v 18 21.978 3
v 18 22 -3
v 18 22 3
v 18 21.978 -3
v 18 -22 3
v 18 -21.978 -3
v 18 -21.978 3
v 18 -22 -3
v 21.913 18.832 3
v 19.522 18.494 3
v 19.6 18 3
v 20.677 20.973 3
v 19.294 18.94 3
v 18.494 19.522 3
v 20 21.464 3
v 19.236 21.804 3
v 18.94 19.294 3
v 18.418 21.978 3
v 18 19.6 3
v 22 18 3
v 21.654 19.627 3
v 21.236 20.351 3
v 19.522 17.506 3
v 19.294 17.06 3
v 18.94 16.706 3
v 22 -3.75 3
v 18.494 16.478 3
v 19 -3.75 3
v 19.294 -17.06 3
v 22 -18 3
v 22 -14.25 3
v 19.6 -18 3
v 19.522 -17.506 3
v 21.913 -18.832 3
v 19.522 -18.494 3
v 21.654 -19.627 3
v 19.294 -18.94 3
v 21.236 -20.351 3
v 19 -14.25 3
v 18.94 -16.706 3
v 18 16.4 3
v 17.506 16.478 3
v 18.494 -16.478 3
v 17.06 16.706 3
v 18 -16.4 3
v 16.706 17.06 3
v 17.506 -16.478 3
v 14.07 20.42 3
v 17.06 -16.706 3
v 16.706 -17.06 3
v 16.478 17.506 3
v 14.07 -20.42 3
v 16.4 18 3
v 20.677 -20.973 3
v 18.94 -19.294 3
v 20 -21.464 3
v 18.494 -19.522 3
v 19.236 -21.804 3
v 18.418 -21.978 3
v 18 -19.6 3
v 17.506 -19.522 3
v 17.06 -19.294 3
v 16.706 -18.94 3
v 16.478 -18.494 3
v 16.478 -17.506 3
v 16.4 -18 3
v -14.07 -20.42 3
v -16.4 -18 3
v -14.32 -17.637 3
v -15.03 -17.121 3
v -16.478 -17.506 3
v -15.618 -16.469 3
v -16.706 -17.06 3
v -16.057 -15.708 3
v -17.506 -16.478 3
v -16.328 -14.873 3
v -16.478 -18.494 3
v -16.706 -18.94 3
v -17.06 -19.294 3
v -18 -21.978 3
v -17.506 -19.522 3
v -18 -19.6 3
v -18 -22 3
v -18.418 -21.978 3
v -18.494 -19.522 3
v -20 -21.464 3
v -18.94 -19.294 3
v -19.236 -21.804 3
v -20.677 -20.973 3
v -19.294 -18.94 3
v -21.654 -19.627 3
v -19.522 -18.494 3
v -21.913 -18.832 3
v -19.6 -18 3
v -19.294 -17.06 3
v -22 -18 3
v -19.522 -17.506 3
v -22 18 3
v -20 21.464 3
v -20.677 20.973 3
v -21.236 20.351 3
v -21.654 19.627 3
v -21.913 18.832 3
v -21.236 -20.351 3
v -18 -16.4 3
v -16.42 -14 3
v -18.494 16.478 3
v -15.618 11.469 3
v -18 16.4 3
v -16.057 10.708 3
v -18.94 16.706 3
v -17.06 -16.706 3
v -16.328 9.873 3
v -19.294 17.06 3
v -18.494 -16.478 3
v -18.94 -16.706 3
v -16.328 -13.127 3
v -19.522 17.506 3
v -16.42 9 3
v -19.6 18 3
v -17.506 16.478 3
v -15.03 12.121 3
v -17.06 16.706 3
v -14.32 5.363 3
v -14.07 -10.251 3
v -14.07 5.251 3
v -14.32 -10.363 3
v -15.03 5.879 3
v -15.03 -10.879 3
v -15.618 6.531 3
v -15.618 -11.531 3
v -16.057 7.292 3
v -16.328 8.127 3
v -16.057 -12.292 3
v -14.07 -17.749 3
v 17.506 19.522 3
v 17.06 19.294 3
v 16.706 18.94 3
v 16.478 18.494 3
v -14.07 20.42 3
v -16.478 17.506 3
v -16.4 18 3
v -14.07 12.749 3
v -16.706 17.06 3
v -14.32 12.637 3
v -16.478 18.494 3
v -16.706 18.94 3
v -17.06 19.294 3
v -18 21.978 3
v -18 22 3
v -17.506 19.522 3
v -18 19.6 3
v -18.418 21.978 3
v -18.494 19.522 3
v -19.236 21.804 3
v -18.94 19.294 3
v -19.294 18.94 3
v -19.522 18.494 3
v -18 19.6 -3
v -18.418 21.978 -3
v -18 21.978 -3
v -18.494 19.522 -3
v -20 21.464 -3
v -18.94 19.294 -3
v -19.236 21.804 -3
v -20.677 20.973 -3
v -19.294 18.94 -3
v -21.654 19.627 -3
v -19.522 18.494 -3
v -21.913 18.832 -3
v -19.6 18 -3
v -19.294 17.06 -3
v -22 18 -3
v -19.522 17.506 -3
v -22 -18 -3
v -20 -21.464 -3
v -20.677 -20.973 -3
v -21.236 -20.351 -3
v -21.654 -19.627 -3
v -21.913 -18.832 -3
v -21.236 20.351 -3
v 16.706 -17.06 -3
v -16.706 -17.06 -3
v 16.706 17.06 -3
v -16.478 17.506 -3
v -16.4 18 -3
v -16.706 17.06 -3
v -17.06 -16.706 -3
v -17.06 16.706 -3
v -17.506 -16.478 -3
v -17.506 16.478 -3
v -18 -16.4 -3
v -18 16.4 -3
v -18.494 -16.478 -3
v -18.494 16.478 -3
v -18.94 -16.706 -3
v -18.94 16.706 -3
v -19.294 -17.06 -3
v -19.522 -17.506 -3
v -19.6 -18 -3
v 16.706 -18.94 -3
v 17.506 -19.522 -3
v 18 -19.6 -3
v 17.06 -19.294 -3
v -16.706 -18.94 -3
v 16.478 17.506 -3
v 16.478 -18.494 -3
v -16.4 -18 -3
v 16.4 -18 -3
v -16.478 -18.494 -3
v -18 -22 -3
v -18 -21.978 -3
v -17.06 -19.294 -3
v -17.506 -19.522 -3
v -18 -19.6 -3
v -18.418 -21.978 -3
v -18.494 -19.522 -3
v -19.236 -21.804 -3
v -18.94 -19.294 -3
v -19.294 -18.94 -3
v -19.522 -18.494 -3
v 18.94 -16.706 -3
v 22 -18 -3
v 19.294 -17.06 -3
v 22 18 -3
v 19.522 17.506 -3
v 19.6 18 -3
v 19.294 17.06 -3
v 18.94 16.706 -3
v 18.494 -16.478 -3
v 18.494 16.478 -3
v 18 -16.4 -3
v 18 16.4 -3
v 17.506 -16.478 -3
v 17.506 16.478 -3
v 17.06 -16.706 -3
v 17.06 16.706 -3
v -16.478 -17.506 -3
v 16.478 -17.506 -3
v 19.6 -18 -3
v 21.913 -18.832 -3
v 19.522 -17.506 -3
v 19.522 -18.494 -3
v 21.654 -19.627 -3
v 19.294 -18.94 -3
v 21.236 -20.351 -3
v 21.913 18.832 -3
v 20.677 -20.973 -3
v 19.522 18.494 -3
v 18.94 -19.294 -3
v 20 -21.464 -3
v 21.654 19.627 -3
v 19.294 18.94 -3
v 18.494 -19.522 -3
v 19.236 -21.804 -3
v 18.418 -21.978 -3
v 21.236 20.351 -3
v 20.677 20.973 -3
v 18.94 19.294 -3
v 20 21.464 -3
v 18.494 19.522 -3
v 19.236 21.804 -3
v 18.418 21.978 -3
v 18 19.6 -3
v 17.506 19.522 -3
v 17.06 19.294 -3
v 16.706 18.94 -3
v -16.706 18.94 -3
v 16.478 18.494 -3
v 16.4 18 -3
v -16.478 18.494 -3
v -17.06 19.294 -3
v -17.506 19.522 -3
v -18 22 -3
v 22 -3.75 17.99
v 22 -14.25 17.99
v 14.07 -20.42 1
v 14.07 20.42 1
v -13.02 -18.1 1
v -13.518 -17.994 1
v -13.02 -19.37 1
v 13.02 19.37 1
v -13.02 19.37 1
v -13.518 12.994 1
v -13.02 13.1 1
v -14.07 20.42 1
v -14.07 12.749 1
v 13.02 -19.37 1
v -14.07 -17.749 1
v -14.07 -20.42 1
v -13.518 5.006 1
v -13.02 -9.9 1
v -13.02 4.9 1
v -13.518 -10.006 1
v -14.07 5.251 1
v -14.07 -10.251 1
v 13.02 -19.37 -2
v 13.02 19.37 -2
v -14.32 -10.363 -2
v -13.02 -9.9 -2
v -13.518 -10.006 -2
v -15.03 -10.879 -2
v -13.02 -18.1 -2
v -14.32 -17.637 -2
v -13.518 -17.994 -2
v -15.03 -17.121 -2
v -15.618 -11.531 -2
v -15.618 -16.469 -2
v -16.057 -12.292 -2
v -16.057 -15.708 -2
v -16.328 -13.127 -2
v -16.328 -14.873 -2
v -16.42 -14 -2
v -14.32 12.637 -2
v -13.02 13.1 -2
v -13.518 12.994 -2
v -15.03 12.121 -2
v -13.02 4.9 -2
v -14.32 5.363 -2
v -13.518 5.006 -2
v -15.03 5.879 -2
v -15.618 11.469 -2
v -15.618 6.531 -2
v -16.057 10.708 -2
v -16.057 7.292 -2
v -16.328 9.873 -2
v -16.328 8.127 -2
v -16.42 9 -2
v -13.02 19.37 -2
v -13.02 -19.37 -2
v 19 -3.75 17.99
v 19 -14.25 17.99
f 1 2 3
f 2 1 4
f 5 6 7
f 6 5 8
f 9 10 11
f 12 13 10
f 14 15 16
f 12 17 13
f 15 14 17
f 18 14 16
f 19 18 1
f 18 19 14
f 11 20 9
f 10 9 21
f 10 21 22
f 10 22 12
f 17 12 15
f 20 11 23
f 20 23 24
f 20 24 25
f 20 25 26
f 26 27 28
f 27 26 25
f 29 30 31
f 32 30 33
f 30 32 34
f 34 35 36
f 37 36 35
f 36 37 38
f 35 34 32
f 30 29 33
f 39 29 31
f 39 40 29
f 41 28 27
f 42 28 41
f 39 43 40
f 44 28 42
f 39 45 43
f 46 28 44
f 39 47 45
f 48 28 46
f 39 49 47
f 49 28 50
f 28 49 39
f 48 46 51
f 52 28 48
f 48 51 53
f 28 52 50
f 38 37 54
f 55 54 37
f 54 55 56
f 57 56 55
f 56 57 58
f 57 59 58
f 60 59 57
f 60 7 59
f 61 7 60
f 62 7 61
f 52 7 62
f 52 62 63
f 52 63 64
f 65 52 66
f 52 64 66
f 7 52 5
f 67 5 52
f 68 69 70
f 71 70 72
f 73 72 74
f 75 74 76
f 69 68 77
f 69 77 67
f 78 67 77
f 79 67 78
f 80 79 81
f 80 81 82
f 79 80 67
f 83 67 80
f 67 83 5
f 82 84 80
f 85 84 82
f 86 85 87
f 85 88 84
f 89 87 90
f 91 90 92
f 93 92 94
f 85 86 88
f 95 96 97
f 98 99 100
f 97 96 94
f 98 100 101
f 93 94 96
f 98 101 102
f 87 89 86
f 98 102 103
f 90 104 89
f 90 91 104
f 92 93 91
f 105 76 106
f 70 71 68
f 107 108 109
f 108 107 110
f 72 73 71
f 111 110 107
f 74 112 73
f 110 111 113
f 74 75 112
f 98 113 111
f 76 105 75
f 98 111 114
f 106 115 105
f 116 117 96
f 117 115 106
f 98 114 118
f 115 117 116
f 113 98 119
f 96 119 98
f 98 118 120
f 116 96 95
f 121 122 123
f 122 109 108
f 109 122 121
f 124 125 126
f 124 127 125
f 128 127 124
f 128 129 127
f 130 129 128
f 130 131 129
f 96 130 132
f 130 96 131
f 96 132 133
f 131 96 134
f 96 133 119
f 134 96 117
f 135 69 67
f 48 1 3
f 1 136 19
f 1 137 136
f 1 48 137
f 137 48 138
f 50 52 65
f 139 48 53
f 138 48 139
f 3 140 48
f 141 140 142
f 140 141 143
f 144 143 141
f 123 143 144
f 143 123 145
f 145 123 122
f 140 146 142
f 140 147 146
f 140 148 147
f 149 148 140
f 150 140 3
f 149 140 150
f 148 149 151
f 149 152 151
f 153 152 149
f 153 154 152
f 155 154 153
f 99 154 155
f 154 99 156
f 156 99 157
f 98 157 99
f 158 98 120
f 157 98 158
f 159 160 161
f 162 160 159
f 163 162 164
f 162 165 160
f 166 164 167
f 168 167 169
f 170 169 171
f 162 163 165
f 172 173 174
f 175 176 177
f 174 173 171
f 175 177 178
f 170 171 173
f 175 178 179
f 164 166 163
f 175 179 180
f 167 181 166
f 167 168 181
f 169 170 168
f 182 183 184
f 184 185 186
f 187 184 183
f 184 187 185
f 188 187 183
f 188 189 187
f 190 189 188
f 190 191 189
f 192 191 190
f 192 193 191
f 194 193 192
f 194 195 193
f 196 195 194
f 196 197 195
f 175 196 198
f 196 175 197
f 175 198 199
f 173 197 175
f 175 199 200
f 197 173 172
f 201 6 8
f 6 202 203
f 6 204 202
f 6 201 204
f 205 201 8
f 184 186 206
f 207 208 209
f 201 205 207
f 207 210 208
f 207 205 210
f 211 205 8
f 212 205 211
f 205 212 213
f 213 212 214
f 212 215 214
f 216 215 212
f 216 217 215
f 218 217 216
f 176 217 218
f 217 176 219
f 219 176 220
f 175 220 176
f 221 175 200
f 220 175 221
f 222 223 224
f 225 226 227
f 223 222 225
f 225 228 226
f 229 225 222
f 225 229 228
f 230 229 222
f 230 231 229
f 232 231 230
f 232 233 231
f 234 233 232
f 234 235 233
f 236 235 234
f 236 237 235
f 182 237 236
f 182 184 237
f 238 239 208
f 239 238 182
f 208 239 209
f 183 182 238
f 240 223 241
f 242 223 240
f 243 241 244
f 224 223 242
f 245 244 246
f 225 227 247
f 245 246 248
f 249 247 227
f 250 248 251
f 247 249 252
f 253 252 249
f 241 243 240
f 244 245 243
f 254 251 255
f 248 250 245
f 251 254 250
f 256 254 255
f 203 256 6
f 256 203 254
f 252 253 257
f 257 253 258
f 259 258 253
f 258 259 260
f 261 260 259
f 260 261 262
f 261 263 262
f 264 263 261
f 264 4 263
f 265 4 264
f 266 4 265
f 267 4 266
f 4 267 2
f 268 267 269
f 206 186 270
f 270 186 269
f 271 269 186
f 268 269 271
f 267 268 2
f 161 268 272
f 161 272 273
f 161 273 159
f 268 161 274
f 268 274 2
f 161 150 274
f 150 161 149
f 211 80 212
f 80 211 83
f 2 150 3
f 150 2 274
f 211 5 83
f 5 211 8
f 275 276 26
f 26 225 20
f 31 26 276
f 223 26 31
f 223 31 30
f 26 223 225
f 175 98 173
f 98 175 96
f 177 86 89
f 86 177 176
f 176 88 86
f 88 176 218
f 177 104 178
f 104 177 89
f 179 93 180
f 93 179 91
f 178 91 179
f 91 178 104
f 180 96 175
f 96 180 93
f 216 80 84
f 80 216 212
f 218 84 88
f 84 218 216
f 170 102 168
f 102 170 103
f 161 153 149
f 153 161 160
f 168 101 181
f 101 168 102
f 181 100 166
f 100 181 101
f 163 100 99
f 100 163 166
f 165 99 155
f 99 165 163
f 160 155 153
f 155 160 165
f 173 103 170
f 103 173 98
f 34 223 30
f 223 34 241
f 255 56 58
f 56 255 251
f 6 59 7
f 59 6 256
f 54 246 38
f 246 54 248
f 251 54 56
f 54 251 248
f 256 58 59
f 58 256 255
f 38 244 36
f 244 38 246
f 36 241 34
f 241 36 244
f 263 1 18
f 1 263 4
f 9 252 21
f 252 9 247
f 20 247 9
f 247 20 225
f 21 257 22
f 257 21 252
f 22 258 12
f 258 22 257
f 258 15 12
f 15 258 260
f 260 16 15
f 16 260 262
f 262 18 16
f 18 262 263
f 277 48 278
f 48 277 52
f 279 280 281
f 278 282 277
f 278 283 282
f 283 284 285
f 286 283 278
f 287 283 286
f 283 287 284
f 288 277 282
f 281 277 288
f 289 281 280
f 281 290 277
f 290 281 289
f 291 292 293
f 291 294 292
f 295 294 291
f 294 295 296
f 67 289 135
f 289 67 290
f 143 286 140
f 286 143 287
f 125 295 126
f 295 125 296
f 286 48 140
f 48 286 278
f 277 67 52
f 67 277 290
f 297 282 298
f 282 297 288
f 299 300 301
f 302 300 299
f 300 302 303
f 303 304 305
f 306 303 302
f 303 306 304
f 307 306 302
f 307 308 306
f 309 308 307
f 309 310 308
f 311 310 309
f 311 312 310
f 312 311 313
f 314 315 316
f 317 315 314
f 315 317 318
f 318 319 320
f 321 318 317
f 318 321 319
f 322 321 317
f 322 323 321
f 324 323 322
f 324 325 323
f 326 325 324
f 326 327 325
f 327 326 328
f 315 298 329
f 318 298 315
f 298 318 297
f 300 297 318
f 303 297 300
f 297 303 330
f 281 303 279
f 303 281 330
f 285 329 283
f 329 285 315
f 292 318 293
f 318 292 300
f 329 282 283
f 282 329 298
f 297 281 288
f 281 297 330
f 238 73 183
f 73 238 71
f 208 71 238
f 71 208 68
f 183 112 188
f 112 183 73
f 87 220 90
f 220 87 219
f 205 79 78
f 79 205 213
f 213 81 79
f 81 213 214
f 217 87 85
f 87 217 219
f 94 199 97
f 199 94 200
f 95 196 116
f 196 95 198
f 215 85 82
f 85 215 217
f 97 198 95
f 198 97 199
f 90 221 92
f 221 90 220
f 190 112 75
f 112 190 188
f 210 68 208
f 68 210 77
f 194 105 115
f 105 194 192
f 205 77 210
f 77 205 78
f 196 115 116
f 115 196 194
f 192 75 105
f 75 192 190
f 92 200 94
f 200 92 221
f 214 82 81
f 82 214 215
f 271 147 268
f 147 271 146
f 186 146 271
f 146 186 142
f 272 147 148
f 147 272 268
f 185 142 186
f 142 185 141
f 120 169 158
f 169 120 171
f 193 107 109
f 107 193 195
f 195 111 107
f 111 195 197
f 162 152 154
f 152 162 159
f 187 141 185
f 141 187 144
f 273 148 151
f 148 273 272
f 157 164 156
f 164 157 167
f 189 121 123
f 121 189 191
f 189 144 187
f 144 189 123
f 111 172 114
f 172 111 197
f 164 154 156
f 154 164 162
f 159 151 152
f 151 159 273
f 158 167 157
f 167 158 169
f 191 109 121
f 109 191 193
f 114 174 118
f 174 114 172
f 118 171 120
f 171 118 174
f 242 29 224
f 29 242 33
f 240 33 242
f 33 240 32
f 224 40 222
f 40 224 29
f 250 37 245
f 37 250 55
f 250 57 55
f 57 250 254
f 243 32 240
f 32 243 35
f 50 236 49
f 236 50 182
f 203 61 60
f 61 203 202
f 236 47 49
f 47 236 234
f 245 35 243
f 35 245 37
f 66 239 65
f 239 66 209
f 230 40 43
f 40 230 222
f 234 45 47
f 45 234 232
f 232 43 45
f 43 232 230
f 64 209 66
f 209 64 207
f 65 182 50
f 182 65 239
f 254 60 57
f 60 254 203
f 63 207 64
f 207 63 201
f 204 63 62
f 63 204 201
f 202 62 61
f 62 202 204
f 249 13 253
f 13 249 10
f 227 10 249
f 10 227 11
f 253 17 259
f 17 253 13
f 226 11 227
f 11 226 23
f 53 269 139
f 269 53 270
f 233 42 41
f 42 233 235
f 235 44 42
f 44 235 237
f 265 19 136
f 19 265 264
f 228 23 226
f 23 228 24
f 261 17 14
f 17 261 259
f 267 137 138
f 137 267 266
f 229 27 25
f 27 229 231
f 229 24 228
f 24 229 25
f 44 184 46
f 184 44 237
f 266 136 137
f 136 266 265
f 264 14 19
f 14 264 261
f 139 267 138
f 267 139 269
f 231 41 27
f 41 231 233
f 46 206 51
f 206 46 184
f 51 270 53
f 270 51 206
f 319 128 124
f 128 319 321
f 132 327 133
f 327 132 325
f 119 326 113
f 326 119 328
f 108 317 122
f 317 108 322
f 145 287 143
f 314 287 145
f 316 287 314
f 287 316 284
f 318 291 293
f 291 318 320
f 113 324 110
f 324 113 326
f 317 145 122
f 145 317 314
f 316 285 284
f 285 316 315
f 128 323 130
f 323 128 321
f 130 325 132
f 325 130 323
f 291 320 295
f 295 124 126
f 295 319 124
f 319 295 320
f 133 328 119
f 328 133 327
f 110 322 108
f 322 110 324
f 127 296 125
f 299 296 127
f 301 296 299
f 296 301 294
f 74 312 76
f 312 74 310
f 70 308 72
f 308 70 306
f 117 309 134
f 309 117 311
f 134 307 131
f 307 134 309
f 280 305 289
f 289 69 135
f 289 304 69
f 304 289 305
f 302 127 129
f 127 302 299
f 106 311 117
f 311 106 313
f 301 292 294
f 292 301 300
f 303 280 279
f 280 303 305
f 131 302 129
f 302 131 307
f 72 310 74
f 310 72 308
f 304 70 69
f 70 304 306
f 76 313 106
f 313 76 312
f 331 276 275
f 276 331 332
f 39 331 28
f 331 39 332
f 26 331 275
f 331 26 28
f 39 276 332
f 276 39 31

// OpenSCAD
// file: electronics.scad
/*
 * electronics.scad 
 *
 * (c) 2015 Prof Dr Andreas Mueller, Hochschule Rapperswil
 */
board_width = 27.94 + 0.1;
board_height = 40.64 + 0.1;
board_thickness = 2.0;

gap = 0.1;

width = 44;
height = 44;
r = 4;
bottom_height = 6;
top_height = 18;

button1_x = -board_width / 2 + 1.8;
button1_y = -9;

button2_x = -board_width / 2 + 1.8;
button2_y = +14;

led1_x = 25.5 - board_width/2;
led1_y = 18;
led2_x = led1_x;
led2_y = 1.5;

switchwidth = 3.5;
switchheight = 4.5;

button_gap = 0.2;

module bottom_part() {
	difference() {
		union() {
			cube([width - 2 * r, height, bottom_height], center = true);
			cube([width, height - 2 * r, bottom_height], center = true);
			translate([-width/2 + r, -height/2 + r, 0])
				cylinder(r = r, h = bottom_height, center = true, $fn = 30);
			translate([-width/2 + r, +height/2 - r, 0])
				cylinder(r = r, h = bottom_height, center = true, $fn = 30);
			translate([+width/2 - r, -height/2 + r, 0])
				cylinder(r = r, h = bottom_height, center = true, $fn = 30);
			translate([+width/2 - r, +height/2 - r, 0])
				cylinder(r = r, h = bottom_height, center = true, $fn = 30);
		}
		union() {
			translate([0, 0, bottom_height - board_thickness])
				cube([board_width + gap, board_height + gap, bottom_height], center = true);
			translate([0, 0, 1])
				cube([board_width - 2, board_height - 2, bottom_height], center = true);
			translate([-width/2 + r, -height/2 + r, 0])
				cylinder(r = 1.6, h = bottom_height + 11, center = true, $fn = 20);
			translate([-width/2 + r, +height/2 - r, 0])
				cylinder(r = 1.6, h = bottom_height + 1, center = true, $fn = 20);
			translate([+width/2 - r, -height/2 + r, 0])
				cylinder(r = 1.6, h = bottom_height + 1, center = true, $fn = 20);
			translate([+width/2 - r, +height/2 - r, 0])
				cylinder(r = 1.6, h = bottom_height + 1, center = true, $fn = 20);
			translate([button1_x, -button1_y, 1])
				cylinder(r = 4 + button_gap, h = bottom_height,  center = true, $fn = 30);
			translate([button2_x, -button2_y, 1])
				cylinder(r = 4 + button_gap, h = bottom_height,  center = true, $fn = 30);
		}
	}
	translate([width/2 - 1.5, -9, 15/2 + bottom_height/2 - 0.01])
		cube([3, 10.5, 15], center = true);
}

module	screwhole() {
		cylinder(r = 1.6, h = top_height + 1, center = true, $fn = 20);
		translate([0, 0, -(top_height + 0.01) / 2])
			cylinder(r1 = 3, r2 = 0, h = 3, $fn = 20);
}

module button_cutout() {
	cylinder(r = 3 + button_gap, h = top_height + 0.1, center = true, $fn = 20);
	translate([0, 0, 1])
		cylinder(r = 4 + button_gap, h = top_height, center = true, $fn = 20);
}

module top_part() {
	difference() {
		union() {
			cube([width - 2 * r, height, top_height], center = true);
			cube([width, height - 2 * r, top_height], center = true);
			translate([-width/2 + r, -height/2 + r, 0])
				cylinder(r = r, h = top_height, center = true, $fn = 20);
			translate([-width/2 + r, +height/2 - r, 0])
				cylinder(r = r, h = top_height, center = true, $fn = 20);
			translate([+width/2 - r, -height/2 + r, 0])
				cylinder(r = r, h = top_height, center = true, $fn = 20);
			translate([+width/2 - r, +height/2 - r, 0])
				cylinder(r = r, h = top_height, center = true, $fn = 20);
		}
		union() {
			difference() {
				union() {
					translate([0, 0, 1])
						cube([board_width, board_height - 2, top_height], center = true);
					translate([0, 0, 1])
						cube([board_width - 2, board_height, top_height], center = true);
				}
				translate([led1_x + 1, led1_y, -2])
					cube([6, 5, top_height], center = true);
				translate([led2_x + 1, led2_y, -2])
					cube([6, 4, top_height], center = true);
			}
			translate([-width/2 + r, -height/2 + r, 0])
				screwhole();
			translate([-width/2 + r, +height/2 - r, 0])
				screwhole();
			translate([+width/2 - r, -height/2 + r, 0])
				screwhole();
			translate([+width/2 - r, +height/2 - r, 0])
				screwhole();
			// opening for the power connector
			translate([width/2, -10, top_height/2 - 4.99])
				cube([20, 10, 10], center = true);
			// opening for 
			translate([width/2,  9, 1])
				cube([20, 11, top_height], center = true);
			// openings for buttons
			translate([button1_x, button1_y, 0])
				button_cutout();
			translate([button2_x, button2_y, 0])
				button_cutout();
			// holes for fibre optics
			translate([led1_x, led1_y, 0])
				cylinder(r = 0.9, h = top_height + 1, center = true, $fn = 10);
			translate([led2_x, led2_y, 0])
				cylinder(r = 0.9, h = top_height + 1, center = true, $fn = 10);
		}
	}
//	translate([button1_x, button1_y, 0]) button();
//	translate([button2_x, button2_y, 0]) button();
}

module button() {
	difference() {
		union() {
			translate([0, 0, -1])
				cylinder(r = 3, h = top_height, center = true, $fn = 20);
			translate([0, 0, 1])
				cylinder(r = 4, h = top_height - 4, center = true, $fn = 20);
			translate([0, 0, -(top_height - 4) / 2])
				cylinder(r1 = 2, r2 = 4, h = 2, center = true, $fn = 20);
		}
		translate([-switchwidth/2 + 4, 0, top_height - switchheight])
			cube([10, 10, top_height], center = true);
	}
}
// main file
/*
 * bottom.scad -- bottom part of the electornics housing
 *
 * (c) 2015 Prof Dr Andreas Mueller, Hochschule Rapperswil
 */

include <electronics.scad>

bottom_part();
